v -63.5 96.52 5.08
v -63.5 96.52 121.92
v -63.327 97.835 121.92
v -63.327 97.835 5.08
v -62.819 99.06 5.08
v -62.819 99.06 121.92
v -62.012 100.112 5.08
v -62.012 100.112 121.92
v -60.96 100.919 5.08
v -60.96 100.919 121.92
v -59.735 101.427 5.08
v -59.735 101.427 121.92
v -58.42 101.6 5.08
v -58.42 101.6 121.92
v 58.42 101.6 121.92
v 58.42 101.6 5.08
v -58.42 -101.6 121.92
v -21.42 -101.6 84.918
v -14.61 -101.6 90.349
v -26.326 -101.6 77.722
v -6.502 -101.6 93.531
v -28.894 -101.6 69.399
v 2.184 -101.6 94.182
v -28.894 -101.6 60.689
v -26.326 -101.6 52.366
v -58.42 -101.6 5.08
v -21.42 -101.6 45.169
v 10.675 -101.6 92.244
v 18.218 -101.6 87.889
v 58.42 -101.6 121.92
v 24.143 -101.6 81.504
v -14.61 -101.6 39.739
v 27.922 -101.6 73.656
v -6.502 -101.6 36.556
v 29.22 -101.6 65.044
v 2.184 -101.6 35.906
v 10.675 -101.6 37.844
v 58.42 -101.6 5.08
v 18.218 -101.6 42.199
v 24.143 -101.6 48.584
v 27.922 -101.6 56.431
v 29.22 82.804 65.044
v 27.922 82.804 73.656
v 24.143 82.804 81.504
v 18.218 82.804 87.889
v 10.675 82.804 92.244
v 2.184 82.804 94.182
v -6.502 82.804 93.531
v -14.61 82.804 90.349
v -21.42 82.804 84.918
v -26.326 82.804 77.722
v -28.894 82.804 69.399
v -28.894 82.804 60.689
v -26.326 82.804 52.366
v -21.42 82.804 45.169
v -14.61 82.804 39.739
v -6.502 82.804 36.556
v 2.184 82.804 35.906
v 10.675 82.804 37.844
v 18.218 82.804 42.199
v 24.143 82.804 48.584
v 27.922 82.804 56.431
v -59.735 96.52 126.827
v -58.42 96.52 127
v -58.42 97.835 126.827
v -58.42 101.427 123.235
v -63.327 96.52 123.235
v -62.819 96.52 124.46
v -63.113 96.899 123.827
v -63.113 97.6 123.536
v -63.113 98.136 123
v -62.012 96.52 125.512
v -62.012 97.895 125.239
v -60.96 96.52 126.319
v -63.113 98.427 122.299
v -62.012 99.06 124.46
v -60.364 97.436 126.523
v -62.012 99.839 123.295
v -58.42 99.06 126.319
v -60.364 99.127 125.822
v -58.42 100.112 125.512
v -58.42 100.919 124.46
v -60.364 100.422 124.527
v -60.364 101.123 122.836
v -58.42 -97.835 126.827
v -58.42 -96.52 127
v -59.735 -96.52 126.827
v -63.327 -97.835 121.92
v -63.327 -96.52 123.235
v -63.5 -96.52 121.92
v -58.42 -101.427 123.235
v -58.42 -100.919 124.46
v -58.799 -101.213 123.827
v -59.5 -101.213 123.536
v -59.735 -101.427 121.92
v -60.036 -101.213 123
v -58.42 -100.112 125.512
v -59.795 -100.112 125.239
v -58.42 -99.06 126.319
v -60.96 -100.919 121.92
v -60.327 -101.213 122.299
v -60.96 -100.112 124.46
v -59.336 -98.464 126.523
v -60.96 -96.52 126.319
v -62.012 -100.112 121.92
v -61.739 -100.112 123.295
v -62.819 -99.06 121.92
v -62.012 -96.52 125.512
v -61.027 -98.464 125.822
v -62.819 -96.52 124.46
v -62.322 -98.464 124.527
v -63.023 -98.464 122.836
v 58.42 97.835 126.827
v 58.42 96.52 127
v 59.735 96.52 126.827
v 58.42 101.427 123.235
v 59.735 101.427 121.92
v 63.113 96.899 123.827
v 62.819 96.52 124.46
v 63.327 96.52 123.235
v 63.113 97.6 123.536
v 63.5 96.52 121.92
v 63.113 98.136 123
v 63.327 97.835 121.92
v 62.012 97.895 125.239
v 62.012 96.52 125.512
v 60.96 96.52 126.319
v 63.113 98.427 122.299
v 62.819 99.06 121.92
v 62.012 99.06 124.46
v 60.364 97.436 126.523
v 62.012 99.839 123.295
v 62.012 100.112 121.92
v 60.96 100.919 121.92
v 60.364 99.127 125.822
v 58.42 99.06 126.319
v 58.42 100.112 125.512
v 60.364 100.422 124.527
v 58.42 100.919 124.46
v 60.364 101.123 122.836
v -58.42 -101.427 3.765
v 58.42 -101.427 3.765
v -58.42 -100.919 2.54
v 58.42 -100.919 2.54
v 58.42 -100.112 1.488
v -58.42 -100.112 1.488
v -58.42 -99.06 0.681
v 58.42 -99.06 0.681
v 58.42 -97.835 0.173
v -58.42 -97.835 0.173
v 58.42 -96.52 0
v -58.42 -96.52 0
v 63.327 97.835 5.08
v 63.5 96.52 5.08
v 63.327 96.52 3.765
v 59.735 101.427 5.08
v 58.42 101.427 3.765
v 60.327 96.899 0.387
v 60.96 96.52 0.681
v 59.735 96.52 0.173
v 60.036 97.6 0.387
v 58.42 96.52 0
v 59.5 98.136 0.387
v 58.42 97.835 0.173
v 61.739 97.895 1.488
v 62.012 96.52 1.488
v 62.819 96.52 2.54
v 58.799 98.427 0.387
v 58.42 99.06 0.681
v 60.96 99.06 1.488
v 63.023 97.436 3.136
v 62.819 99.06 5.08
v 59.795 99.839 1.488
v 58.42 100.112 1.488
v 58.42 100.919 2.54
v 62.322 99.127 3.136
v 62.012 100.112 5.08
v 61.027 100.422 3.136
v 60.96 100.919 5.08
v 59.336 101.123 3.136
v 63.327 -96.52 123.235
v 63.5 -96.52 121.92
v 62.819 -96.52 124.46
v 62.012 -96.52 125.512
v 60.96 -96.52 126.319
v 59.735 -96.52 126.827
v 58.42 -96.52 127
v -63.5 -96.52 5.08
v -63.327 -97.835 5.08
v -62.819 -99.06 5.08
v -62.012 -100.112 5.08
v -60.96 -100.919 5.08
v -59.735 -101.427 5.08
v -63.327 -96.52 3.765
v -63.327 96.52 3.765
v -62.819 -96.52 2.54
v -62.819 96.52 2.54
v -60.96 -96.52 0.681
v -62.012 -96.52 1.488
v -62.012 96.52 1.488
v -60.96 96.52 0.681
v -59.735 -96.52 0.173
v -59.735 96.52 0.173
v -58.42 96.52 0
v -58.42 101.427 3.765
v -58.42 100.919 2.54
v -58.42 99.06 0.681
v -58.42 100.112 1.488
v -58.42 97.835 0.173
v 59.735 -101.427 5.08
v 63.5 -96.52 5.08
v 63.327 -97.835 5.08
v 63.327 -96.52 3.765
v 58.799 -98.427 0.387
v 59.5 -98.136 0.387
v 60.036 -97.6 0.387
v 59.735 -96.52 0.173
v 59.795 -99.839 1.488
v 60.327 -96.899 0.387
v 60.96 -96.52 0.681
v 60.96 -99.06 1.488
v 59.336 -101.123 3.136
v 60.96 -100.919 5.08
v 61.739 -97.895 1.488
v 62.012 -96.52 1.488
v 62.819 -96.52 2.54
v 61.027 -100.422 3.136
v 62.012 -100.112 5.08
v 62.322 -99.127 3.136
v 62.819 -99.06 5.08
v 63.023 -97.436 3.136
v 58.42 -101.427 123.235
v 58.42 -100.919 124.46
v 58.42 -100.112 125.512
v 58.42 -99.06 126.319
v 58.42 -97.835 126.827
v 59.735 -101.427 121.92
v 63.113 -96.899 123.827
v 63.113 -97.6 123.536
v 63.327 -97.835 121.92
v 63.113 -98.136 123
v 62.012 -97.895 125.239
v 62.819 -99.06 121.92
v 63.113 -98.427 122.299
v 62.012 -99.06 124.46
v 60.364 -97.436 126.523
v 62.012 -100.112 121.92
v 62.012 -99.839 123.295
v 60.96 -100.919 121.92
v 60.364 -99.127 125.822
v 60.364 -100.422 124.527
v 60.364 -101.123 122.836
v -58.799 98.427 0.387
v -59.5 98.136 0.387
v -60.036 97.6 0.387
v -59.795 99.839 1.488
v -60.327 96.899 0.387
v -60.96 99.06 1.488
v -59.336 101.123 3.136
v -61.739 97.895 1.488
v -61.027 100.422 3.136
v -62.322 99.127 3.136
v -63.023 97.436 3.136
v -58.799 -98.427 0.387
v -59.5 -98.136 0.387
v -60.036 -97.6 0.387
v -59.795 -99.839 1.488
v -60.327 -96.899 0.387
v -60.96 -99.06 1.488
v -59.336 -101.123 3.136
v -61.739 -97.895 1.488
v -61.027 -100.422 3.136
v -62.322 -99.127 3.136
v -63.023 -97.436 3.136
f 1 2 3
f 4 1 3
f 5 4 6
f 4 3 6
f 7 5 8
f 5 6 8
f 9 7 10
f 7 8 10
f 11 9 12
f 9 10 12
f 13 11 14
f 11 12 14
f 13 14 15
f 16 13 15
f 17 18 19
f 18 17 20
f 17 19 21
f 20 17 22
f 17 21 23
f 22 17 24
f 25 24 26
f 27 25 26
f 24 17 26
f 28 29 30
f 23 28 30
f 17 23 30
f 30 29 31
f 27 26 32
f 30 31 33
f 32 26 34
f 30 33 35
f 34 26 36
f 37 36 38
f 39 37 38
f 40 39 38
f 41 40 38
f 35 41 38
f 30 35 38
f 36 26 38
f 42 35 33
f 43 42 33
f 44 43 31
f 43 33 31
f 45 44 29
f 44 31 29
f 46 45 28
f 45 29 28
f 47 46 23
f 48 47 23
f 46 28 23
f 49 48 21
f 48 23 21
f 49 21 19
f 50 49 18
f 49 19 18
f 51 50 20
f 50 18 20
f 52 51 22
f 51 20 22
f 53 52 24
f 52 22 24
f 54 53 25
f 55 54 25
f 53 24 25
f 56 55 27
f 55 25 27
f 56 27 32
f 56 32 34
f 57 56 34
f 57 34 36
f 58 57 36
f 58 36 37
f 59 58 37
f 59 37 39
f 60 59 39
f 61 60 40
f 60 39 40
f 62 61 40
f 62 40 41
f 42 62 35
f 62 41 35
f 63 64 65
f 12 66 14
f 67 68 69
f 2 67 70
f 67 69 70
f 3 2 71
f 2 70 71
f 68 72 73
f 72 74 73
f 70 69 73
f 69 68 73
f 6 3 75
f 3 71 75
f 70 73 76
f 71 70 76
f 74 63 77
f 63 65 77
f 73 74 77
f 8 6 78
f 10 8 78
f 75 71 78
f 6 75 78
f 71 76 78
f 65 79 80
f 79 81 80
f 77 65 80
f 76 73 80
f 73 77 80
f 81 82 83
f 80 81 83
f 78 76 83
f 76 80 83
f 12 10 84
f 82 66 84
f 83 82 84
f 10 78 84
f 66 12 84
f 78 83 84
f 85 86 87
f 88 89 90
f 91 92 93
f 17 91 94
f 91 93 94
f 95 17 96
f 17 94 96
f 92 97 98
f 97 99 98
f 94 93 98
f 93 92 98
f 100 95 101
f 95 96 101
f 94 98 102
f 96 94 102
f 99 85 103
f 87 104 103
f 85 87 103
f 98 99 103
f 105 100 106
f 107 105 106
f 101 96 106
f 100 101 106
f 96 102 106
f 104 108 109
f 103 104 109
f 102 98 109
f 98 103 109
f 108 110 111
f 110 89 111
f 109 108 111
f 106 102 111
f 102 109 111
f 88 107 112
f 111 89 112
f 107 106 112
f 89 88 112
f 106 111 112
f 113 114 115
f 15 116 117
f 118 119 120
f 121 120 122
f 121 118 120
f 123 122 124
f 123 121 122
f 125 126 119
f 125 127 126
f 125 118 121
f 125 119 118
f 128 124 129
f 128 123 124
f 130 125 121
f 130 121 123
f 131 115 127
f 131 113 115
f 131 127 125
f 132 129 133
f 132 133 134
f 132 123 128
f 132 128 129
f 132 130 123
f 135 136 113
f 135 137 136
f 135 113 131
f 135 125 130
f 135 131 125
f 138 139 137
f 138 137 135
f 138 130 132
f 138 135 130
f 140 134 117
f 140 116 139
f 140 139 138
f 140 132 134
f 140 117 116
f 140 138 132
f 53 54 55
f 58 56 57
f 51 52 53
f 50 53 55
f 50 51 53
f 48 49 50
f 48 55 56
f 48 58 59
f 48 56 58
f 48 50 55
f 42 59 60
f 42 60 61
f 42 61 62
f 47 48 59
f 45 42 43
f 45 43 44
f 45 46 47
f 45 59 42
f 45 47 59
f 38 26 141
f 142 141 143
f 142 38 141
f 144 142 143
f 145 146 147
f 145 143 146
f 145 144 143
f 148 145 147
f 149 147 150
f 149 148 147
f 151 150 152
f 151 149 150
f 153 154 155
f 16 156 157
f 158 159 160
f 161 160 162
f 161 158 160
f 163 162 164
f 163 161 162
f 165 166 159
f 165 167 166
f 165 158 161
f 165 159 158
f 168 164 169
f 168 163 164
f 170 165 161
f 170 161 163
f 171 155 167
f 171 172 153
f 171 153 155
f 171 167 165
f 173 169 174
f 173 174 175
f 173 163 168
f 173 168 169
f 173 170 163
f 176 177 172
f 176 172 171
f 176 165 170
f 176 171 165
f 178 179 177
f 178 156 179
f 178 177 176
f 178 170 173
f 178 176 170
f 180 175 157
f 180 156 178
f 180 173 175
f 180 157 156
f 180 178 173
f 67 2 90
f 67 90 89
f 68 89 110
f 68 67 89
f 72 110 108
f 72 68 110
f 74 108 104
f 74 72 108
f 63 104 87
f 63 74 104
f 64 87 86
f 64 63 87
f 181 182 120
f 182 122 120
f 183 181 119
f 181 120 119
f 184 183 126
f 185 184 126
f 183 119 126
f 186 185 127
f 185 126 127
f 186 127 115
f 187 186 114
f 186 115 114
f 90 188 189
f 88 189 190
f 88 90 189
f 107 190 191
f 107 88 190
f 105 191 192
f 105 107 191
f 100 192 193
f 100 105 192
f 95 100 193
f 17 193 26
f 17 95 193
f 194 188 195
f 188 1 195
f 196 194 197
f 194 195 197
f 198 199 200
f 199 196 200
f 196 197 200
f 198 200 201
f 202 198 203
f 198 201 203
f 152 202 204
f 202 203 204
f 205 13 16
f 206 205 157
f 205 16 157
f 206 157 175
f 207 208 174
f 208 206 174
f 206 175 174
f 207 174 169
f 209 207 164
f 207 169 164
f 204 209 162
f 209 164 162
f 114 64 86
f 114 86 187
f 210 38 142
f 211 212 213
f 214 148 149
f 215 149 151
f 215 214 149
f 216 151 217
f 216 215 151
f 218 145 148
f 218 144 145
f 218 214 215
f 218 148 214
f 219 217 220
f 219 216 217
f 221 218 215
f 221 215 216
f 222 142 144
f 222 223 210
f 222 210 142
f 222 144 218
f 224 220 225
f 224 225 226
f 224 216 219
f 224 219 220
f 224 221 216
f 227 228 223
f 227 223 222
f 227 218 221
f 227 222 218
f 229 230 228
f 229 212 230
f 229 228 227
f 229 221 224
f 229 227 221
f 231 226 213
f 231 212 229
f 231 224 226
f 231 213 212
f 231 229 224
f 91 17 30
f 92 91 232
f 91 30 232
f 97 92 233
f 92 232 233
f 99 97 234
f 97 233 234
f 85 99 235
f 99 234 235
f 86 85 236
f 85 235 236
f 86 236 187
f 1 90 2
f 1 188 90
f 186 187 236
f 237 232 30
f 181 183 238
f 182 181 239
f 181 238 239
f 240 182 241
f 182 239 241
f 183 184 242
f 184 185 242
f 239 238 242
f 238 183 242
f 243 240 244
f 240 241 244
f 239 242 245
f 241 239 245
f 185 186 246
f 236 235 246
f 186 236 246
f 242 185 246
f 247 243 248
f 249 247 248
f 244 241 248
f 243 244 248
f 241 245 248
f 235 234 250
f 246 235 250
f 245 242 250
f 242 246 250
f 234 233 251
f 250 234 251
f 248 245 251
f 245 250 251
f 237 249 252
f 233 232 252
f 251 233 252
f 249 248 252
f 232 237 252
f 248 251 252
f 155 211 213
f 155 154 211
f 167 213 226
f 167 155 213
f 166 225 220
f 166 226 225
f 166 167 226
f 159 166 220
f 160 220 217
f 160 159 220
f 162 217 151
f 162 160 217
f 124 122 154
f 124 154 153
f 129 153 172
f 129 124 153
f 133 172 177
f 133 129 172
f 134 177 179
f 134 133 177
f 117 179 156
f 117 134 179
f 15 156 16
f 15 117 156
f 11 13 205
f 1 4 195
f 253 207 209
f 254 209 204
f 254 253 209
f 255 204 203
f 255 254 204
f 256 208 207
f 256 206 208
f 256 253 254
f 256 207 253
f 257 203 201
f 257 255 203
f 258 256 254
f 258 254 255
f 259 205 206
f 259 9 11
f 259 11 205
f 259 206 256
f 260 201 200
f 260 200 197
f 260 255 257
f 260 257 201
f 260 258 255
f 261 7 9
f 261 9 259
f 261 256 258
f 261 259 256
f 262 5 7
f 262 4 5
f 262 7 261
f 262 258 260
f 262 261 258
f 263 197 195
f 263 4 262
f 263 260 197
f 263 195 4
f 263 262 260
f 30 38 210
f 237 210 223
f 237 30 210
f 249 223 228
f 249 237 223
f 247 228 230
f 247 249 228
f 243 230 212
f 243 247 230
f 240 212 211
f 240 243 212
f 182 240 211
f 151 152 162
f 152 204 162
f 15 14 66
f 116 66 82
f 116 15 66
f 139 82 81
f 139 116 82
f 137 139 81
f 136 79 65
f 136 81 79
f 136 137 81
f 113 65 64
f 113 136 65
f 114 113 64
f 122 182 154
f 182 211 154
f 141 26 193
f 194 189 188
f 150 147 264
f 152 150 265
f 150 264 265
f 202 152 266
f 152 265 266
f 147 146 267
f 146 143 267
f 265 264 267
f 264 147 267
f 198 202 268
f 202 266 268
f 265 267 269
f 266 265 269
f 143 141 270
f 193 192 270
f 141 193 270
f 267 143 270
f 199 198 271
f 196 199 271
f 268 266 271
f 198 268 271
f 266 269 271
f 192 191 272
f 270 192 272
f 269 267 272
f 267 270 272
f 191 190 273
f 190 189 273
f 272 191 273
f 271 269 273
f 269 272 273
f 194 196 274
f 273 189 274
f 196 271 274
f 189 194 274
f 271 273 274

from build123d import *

# Parameters (mm, degrees)
F0_W     = 127
F0_H     = 203.2
F1_DEPTH = 127
F2_R     = 5.08
F3_R     = 29.219894
F4_DEPTH = 184.404


with BuildPart() as f1:
    # F0 (on Top) → F1 (new body)
    with BuildSketch(Plane.XY):
        Rectangle(F0_W, F0_H)
    extrude(amount=F1_DEPTH)

    # F2
    f2_edges = [f1.edges().sort_by_distance(p)[0] for p in [
        (0, 101.6, 127),
        (-63.5, 0, 127),
        (0, -101.6, 127),
        (63.5, 0, 127),
        (-63.5, -101.6, 63.5),
        (63.5, -101.6, 63.5),
        (0, -101.6, 0),
        (63.5, 101.6, 63.5),
        (63.5, 0, 0),
        (-63.5, 101.6, 63.5),
        (0, 101.6, 0),
        (-63.5, 0, 0),
    ]]
    fillet(f2_edges, radius=F2_R)

    # F3 (on face) → F4 (cut)
    with BuildSketch(Plane.XZ.offset(101.6)):
        with Locations((0, 65.043747)):
            Circle(F3_R)
    extrude(amount=-F4_DEPTH, mode=Mode.SUBTRACT)


solid = f1.part
